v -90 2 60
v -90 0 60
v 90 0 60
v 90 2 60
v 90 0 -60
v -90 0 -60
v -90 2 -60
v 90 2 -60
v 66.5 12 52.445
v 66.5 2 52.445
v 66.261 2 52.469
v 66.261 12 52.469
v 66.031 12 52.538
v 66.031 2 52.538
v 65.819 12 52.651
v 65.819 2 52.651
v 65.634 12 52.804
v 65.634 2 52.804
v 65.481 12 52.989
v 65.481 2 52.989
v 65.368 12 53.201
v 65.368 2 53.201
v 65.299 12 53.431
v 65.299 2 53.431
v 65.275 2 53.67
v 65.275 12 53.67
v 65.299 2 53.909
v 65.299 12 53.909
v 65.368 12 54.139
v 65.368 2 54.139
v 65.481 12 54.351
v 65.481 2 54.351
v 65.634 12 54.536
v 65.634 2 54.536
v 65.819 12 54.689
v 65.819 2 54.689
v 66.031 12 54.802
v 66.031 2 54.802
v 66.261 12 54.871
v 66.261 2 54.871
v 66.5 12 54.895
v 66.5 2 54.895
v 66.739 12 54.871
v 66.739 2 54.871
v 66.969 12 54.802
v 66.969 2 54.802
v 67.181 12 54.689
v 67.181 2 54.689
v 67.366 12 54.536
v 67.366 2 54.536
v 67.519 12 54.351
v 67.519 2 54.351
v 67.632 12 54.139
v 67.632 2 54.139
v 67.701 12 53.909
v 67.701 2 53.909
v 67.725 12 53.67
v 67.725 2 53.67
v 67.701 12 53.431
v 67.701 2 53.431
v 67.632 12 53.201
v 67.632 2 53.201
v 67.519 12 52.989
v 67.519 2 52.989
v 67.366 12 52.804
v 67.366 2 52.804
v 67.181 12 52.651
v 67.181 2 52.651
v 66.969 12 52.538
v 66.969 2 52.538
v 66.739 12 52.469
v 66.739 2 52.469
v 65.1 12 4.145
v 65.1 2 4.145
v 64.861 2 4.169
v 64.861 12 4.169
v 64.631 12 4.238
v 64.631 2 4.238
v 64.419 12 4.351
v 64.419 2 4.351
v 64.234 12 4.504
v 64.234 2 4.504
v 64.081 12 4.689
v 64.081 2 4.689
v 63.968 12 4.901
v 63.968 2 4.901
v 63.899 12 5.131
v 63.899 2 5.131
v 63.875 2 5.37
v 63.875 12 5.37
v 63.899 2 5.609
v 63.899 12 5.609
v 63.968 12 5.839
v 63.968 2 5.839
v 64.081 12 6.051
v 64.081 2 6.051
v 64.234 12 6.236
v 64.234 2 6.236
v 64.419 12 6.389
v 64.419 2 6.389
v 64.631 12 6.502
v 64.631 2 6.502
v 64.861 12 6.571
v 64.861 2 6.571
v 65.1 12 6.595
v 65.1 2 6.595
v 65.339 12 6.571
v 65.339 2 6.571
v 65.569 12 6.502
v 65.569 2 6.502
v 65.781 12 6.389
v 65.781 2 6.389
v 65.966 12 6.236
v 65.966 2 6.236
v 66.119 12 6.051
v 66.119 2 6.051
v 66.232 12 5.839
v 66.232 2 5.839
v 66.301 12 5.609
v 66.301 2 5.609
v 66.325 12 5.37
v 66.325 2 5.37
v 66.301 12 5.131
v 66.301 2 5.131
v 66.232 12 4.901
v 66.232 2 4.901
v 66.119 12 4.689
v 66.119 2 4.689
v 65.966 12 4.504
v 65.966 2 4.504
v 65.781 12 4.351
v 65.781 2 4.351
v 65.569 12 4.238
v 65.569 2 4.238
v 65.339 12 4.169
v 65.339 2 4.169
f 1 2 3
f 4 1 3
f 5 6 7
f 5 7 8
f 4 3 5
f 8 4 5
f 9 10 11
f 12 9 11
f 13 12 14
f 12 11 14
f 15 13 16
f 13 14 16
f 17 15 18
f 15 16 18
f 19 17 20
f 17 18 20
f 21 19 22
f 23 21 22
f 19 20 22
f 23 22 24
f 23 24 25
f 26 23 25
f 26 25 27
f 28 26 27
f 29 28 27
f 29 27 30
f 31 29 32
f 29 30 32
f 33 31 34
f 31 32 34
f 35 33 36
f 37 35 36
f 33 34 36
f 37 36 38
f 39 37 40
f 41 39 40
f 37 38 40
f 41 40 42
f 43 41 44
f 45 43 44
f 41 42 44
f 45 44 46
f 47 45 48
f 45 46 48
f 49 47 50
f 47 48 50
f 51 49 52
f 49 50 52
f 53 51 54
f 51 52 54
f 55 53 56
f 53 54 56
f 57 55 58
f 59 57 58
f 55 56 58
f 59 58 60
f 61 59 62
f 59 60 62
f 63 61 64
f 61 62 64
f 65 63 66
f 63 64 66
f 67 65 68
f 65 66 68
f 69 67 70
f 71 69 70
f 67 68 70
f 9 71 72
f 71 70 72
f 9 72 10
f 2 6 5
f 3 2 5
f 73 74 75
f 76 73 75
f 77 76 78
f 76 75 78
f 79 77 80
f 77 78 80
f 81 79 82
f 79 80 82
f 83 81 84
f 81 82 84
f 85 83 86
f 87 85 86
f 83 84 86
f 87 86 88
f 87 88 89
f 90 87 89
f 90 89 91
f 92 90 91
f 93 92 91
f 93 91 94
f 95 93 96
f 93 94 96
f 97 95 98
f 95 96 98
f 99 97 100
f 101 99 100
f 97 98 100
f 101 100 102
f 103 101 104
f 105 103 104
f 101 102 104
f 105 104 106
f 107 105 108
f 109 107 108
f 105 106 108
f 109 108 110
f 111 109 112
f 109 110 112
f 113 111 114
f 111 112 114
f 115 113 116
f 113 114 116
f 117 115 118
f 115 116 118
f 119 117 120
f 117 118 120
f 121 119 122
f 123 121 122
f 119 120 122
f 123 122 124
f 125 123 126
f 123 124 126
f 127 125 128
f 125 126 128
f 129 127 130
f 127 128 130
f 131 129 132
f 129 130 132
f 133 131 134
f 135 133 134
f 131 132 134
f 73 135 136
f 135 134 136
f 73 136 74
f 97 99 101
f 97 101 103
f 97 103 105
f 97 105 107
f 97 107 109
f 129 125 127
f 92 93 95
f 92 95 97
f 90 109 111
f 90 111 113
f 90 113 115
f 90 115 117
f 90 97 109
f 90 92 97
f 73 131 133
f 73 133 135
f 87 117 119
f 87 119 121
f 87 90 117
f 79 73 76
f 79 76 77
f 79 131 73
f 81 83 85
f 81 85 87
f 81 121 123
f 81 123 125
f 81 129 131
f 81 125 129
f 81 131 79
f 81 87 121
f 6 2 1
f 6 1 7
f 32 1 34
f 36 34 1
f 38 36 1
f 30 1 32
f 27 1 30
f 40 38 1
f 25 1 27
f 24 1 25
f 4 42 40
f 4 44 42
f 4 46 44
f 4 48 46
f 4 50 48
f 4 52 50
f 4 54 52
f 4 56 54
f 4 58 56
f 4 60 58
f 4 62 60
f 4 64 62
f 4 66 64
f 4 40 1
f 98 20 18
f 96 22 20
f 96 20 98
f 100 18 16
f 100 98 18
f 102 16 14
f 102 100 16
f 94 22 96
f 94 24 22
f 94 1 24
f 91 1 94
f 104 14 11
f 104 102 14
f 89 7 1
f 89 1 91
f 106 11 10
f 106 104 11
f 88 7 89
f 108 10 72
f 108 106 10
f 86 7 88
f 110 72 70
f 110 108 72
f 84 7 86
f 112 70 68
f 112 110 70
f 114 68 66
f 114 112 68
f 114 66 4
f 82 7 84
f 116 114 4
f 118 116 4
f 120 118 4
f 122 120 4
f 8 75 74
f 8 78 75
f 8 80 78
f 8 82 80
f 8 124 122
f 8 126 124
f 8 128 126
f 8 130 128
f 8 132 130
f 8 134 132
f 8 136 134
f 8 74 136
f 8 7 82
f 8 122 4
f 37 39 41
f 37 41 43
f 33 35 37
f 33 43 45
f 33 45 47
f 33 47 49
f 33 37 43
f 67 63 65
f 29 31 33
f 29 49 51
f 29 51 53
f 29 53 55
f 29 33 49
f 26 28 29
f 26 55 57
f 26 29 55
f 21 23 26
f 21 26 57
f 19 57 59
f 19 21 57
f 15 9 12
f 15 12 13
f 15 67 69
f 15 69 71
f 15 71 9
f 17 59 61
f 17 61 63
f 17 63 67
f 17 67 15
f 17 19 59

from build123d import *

# Parameters (mm, degrees)
IZIM2_W                     = 180
IZIM2_H                     = 120
Y_KSEKLIK_EKSTR_ZYON1_DEPTH = 2
IZIM3_R                     = 1.225
Y_KSEKLIK_EKSTR_ZYON2_DEPTH = 10


with BuildPart() as part:
    # Çizim2 → Yükseklik-Ekstrüzyon1 (new body)
    with BuildSketch(Plane(origin=(0, 0, 0), x_dir=(1, 0, 0), z_dir=(0, 1, 0))):
        Rectangle(IZIM2_W, IZIM2_H)
    extrude(amount=Y_KSEKLIK_EKSTR_ZYON1_DEPTH)

    # Çizim3 → Yükseklik-Ekstrüzyon2 (add)
    with BuildSketch(Plane(origin=(0, 2, 0), x_dir=(1, 0, 0), z_dir=(0, 1, 0))):
        with Locations(Location((66.5, -53.67, 0), (0, 0, 90))):
            Circle(IZIM3_R)
        with Locations(Location((65.1, -5.37, 0), (0, 0, 90))):
            Circle(IZIM3_R)
    extrude(amount=Y_KSEKLIK_EKSTR_ZYON2_DEPTH)


solid = part.part
